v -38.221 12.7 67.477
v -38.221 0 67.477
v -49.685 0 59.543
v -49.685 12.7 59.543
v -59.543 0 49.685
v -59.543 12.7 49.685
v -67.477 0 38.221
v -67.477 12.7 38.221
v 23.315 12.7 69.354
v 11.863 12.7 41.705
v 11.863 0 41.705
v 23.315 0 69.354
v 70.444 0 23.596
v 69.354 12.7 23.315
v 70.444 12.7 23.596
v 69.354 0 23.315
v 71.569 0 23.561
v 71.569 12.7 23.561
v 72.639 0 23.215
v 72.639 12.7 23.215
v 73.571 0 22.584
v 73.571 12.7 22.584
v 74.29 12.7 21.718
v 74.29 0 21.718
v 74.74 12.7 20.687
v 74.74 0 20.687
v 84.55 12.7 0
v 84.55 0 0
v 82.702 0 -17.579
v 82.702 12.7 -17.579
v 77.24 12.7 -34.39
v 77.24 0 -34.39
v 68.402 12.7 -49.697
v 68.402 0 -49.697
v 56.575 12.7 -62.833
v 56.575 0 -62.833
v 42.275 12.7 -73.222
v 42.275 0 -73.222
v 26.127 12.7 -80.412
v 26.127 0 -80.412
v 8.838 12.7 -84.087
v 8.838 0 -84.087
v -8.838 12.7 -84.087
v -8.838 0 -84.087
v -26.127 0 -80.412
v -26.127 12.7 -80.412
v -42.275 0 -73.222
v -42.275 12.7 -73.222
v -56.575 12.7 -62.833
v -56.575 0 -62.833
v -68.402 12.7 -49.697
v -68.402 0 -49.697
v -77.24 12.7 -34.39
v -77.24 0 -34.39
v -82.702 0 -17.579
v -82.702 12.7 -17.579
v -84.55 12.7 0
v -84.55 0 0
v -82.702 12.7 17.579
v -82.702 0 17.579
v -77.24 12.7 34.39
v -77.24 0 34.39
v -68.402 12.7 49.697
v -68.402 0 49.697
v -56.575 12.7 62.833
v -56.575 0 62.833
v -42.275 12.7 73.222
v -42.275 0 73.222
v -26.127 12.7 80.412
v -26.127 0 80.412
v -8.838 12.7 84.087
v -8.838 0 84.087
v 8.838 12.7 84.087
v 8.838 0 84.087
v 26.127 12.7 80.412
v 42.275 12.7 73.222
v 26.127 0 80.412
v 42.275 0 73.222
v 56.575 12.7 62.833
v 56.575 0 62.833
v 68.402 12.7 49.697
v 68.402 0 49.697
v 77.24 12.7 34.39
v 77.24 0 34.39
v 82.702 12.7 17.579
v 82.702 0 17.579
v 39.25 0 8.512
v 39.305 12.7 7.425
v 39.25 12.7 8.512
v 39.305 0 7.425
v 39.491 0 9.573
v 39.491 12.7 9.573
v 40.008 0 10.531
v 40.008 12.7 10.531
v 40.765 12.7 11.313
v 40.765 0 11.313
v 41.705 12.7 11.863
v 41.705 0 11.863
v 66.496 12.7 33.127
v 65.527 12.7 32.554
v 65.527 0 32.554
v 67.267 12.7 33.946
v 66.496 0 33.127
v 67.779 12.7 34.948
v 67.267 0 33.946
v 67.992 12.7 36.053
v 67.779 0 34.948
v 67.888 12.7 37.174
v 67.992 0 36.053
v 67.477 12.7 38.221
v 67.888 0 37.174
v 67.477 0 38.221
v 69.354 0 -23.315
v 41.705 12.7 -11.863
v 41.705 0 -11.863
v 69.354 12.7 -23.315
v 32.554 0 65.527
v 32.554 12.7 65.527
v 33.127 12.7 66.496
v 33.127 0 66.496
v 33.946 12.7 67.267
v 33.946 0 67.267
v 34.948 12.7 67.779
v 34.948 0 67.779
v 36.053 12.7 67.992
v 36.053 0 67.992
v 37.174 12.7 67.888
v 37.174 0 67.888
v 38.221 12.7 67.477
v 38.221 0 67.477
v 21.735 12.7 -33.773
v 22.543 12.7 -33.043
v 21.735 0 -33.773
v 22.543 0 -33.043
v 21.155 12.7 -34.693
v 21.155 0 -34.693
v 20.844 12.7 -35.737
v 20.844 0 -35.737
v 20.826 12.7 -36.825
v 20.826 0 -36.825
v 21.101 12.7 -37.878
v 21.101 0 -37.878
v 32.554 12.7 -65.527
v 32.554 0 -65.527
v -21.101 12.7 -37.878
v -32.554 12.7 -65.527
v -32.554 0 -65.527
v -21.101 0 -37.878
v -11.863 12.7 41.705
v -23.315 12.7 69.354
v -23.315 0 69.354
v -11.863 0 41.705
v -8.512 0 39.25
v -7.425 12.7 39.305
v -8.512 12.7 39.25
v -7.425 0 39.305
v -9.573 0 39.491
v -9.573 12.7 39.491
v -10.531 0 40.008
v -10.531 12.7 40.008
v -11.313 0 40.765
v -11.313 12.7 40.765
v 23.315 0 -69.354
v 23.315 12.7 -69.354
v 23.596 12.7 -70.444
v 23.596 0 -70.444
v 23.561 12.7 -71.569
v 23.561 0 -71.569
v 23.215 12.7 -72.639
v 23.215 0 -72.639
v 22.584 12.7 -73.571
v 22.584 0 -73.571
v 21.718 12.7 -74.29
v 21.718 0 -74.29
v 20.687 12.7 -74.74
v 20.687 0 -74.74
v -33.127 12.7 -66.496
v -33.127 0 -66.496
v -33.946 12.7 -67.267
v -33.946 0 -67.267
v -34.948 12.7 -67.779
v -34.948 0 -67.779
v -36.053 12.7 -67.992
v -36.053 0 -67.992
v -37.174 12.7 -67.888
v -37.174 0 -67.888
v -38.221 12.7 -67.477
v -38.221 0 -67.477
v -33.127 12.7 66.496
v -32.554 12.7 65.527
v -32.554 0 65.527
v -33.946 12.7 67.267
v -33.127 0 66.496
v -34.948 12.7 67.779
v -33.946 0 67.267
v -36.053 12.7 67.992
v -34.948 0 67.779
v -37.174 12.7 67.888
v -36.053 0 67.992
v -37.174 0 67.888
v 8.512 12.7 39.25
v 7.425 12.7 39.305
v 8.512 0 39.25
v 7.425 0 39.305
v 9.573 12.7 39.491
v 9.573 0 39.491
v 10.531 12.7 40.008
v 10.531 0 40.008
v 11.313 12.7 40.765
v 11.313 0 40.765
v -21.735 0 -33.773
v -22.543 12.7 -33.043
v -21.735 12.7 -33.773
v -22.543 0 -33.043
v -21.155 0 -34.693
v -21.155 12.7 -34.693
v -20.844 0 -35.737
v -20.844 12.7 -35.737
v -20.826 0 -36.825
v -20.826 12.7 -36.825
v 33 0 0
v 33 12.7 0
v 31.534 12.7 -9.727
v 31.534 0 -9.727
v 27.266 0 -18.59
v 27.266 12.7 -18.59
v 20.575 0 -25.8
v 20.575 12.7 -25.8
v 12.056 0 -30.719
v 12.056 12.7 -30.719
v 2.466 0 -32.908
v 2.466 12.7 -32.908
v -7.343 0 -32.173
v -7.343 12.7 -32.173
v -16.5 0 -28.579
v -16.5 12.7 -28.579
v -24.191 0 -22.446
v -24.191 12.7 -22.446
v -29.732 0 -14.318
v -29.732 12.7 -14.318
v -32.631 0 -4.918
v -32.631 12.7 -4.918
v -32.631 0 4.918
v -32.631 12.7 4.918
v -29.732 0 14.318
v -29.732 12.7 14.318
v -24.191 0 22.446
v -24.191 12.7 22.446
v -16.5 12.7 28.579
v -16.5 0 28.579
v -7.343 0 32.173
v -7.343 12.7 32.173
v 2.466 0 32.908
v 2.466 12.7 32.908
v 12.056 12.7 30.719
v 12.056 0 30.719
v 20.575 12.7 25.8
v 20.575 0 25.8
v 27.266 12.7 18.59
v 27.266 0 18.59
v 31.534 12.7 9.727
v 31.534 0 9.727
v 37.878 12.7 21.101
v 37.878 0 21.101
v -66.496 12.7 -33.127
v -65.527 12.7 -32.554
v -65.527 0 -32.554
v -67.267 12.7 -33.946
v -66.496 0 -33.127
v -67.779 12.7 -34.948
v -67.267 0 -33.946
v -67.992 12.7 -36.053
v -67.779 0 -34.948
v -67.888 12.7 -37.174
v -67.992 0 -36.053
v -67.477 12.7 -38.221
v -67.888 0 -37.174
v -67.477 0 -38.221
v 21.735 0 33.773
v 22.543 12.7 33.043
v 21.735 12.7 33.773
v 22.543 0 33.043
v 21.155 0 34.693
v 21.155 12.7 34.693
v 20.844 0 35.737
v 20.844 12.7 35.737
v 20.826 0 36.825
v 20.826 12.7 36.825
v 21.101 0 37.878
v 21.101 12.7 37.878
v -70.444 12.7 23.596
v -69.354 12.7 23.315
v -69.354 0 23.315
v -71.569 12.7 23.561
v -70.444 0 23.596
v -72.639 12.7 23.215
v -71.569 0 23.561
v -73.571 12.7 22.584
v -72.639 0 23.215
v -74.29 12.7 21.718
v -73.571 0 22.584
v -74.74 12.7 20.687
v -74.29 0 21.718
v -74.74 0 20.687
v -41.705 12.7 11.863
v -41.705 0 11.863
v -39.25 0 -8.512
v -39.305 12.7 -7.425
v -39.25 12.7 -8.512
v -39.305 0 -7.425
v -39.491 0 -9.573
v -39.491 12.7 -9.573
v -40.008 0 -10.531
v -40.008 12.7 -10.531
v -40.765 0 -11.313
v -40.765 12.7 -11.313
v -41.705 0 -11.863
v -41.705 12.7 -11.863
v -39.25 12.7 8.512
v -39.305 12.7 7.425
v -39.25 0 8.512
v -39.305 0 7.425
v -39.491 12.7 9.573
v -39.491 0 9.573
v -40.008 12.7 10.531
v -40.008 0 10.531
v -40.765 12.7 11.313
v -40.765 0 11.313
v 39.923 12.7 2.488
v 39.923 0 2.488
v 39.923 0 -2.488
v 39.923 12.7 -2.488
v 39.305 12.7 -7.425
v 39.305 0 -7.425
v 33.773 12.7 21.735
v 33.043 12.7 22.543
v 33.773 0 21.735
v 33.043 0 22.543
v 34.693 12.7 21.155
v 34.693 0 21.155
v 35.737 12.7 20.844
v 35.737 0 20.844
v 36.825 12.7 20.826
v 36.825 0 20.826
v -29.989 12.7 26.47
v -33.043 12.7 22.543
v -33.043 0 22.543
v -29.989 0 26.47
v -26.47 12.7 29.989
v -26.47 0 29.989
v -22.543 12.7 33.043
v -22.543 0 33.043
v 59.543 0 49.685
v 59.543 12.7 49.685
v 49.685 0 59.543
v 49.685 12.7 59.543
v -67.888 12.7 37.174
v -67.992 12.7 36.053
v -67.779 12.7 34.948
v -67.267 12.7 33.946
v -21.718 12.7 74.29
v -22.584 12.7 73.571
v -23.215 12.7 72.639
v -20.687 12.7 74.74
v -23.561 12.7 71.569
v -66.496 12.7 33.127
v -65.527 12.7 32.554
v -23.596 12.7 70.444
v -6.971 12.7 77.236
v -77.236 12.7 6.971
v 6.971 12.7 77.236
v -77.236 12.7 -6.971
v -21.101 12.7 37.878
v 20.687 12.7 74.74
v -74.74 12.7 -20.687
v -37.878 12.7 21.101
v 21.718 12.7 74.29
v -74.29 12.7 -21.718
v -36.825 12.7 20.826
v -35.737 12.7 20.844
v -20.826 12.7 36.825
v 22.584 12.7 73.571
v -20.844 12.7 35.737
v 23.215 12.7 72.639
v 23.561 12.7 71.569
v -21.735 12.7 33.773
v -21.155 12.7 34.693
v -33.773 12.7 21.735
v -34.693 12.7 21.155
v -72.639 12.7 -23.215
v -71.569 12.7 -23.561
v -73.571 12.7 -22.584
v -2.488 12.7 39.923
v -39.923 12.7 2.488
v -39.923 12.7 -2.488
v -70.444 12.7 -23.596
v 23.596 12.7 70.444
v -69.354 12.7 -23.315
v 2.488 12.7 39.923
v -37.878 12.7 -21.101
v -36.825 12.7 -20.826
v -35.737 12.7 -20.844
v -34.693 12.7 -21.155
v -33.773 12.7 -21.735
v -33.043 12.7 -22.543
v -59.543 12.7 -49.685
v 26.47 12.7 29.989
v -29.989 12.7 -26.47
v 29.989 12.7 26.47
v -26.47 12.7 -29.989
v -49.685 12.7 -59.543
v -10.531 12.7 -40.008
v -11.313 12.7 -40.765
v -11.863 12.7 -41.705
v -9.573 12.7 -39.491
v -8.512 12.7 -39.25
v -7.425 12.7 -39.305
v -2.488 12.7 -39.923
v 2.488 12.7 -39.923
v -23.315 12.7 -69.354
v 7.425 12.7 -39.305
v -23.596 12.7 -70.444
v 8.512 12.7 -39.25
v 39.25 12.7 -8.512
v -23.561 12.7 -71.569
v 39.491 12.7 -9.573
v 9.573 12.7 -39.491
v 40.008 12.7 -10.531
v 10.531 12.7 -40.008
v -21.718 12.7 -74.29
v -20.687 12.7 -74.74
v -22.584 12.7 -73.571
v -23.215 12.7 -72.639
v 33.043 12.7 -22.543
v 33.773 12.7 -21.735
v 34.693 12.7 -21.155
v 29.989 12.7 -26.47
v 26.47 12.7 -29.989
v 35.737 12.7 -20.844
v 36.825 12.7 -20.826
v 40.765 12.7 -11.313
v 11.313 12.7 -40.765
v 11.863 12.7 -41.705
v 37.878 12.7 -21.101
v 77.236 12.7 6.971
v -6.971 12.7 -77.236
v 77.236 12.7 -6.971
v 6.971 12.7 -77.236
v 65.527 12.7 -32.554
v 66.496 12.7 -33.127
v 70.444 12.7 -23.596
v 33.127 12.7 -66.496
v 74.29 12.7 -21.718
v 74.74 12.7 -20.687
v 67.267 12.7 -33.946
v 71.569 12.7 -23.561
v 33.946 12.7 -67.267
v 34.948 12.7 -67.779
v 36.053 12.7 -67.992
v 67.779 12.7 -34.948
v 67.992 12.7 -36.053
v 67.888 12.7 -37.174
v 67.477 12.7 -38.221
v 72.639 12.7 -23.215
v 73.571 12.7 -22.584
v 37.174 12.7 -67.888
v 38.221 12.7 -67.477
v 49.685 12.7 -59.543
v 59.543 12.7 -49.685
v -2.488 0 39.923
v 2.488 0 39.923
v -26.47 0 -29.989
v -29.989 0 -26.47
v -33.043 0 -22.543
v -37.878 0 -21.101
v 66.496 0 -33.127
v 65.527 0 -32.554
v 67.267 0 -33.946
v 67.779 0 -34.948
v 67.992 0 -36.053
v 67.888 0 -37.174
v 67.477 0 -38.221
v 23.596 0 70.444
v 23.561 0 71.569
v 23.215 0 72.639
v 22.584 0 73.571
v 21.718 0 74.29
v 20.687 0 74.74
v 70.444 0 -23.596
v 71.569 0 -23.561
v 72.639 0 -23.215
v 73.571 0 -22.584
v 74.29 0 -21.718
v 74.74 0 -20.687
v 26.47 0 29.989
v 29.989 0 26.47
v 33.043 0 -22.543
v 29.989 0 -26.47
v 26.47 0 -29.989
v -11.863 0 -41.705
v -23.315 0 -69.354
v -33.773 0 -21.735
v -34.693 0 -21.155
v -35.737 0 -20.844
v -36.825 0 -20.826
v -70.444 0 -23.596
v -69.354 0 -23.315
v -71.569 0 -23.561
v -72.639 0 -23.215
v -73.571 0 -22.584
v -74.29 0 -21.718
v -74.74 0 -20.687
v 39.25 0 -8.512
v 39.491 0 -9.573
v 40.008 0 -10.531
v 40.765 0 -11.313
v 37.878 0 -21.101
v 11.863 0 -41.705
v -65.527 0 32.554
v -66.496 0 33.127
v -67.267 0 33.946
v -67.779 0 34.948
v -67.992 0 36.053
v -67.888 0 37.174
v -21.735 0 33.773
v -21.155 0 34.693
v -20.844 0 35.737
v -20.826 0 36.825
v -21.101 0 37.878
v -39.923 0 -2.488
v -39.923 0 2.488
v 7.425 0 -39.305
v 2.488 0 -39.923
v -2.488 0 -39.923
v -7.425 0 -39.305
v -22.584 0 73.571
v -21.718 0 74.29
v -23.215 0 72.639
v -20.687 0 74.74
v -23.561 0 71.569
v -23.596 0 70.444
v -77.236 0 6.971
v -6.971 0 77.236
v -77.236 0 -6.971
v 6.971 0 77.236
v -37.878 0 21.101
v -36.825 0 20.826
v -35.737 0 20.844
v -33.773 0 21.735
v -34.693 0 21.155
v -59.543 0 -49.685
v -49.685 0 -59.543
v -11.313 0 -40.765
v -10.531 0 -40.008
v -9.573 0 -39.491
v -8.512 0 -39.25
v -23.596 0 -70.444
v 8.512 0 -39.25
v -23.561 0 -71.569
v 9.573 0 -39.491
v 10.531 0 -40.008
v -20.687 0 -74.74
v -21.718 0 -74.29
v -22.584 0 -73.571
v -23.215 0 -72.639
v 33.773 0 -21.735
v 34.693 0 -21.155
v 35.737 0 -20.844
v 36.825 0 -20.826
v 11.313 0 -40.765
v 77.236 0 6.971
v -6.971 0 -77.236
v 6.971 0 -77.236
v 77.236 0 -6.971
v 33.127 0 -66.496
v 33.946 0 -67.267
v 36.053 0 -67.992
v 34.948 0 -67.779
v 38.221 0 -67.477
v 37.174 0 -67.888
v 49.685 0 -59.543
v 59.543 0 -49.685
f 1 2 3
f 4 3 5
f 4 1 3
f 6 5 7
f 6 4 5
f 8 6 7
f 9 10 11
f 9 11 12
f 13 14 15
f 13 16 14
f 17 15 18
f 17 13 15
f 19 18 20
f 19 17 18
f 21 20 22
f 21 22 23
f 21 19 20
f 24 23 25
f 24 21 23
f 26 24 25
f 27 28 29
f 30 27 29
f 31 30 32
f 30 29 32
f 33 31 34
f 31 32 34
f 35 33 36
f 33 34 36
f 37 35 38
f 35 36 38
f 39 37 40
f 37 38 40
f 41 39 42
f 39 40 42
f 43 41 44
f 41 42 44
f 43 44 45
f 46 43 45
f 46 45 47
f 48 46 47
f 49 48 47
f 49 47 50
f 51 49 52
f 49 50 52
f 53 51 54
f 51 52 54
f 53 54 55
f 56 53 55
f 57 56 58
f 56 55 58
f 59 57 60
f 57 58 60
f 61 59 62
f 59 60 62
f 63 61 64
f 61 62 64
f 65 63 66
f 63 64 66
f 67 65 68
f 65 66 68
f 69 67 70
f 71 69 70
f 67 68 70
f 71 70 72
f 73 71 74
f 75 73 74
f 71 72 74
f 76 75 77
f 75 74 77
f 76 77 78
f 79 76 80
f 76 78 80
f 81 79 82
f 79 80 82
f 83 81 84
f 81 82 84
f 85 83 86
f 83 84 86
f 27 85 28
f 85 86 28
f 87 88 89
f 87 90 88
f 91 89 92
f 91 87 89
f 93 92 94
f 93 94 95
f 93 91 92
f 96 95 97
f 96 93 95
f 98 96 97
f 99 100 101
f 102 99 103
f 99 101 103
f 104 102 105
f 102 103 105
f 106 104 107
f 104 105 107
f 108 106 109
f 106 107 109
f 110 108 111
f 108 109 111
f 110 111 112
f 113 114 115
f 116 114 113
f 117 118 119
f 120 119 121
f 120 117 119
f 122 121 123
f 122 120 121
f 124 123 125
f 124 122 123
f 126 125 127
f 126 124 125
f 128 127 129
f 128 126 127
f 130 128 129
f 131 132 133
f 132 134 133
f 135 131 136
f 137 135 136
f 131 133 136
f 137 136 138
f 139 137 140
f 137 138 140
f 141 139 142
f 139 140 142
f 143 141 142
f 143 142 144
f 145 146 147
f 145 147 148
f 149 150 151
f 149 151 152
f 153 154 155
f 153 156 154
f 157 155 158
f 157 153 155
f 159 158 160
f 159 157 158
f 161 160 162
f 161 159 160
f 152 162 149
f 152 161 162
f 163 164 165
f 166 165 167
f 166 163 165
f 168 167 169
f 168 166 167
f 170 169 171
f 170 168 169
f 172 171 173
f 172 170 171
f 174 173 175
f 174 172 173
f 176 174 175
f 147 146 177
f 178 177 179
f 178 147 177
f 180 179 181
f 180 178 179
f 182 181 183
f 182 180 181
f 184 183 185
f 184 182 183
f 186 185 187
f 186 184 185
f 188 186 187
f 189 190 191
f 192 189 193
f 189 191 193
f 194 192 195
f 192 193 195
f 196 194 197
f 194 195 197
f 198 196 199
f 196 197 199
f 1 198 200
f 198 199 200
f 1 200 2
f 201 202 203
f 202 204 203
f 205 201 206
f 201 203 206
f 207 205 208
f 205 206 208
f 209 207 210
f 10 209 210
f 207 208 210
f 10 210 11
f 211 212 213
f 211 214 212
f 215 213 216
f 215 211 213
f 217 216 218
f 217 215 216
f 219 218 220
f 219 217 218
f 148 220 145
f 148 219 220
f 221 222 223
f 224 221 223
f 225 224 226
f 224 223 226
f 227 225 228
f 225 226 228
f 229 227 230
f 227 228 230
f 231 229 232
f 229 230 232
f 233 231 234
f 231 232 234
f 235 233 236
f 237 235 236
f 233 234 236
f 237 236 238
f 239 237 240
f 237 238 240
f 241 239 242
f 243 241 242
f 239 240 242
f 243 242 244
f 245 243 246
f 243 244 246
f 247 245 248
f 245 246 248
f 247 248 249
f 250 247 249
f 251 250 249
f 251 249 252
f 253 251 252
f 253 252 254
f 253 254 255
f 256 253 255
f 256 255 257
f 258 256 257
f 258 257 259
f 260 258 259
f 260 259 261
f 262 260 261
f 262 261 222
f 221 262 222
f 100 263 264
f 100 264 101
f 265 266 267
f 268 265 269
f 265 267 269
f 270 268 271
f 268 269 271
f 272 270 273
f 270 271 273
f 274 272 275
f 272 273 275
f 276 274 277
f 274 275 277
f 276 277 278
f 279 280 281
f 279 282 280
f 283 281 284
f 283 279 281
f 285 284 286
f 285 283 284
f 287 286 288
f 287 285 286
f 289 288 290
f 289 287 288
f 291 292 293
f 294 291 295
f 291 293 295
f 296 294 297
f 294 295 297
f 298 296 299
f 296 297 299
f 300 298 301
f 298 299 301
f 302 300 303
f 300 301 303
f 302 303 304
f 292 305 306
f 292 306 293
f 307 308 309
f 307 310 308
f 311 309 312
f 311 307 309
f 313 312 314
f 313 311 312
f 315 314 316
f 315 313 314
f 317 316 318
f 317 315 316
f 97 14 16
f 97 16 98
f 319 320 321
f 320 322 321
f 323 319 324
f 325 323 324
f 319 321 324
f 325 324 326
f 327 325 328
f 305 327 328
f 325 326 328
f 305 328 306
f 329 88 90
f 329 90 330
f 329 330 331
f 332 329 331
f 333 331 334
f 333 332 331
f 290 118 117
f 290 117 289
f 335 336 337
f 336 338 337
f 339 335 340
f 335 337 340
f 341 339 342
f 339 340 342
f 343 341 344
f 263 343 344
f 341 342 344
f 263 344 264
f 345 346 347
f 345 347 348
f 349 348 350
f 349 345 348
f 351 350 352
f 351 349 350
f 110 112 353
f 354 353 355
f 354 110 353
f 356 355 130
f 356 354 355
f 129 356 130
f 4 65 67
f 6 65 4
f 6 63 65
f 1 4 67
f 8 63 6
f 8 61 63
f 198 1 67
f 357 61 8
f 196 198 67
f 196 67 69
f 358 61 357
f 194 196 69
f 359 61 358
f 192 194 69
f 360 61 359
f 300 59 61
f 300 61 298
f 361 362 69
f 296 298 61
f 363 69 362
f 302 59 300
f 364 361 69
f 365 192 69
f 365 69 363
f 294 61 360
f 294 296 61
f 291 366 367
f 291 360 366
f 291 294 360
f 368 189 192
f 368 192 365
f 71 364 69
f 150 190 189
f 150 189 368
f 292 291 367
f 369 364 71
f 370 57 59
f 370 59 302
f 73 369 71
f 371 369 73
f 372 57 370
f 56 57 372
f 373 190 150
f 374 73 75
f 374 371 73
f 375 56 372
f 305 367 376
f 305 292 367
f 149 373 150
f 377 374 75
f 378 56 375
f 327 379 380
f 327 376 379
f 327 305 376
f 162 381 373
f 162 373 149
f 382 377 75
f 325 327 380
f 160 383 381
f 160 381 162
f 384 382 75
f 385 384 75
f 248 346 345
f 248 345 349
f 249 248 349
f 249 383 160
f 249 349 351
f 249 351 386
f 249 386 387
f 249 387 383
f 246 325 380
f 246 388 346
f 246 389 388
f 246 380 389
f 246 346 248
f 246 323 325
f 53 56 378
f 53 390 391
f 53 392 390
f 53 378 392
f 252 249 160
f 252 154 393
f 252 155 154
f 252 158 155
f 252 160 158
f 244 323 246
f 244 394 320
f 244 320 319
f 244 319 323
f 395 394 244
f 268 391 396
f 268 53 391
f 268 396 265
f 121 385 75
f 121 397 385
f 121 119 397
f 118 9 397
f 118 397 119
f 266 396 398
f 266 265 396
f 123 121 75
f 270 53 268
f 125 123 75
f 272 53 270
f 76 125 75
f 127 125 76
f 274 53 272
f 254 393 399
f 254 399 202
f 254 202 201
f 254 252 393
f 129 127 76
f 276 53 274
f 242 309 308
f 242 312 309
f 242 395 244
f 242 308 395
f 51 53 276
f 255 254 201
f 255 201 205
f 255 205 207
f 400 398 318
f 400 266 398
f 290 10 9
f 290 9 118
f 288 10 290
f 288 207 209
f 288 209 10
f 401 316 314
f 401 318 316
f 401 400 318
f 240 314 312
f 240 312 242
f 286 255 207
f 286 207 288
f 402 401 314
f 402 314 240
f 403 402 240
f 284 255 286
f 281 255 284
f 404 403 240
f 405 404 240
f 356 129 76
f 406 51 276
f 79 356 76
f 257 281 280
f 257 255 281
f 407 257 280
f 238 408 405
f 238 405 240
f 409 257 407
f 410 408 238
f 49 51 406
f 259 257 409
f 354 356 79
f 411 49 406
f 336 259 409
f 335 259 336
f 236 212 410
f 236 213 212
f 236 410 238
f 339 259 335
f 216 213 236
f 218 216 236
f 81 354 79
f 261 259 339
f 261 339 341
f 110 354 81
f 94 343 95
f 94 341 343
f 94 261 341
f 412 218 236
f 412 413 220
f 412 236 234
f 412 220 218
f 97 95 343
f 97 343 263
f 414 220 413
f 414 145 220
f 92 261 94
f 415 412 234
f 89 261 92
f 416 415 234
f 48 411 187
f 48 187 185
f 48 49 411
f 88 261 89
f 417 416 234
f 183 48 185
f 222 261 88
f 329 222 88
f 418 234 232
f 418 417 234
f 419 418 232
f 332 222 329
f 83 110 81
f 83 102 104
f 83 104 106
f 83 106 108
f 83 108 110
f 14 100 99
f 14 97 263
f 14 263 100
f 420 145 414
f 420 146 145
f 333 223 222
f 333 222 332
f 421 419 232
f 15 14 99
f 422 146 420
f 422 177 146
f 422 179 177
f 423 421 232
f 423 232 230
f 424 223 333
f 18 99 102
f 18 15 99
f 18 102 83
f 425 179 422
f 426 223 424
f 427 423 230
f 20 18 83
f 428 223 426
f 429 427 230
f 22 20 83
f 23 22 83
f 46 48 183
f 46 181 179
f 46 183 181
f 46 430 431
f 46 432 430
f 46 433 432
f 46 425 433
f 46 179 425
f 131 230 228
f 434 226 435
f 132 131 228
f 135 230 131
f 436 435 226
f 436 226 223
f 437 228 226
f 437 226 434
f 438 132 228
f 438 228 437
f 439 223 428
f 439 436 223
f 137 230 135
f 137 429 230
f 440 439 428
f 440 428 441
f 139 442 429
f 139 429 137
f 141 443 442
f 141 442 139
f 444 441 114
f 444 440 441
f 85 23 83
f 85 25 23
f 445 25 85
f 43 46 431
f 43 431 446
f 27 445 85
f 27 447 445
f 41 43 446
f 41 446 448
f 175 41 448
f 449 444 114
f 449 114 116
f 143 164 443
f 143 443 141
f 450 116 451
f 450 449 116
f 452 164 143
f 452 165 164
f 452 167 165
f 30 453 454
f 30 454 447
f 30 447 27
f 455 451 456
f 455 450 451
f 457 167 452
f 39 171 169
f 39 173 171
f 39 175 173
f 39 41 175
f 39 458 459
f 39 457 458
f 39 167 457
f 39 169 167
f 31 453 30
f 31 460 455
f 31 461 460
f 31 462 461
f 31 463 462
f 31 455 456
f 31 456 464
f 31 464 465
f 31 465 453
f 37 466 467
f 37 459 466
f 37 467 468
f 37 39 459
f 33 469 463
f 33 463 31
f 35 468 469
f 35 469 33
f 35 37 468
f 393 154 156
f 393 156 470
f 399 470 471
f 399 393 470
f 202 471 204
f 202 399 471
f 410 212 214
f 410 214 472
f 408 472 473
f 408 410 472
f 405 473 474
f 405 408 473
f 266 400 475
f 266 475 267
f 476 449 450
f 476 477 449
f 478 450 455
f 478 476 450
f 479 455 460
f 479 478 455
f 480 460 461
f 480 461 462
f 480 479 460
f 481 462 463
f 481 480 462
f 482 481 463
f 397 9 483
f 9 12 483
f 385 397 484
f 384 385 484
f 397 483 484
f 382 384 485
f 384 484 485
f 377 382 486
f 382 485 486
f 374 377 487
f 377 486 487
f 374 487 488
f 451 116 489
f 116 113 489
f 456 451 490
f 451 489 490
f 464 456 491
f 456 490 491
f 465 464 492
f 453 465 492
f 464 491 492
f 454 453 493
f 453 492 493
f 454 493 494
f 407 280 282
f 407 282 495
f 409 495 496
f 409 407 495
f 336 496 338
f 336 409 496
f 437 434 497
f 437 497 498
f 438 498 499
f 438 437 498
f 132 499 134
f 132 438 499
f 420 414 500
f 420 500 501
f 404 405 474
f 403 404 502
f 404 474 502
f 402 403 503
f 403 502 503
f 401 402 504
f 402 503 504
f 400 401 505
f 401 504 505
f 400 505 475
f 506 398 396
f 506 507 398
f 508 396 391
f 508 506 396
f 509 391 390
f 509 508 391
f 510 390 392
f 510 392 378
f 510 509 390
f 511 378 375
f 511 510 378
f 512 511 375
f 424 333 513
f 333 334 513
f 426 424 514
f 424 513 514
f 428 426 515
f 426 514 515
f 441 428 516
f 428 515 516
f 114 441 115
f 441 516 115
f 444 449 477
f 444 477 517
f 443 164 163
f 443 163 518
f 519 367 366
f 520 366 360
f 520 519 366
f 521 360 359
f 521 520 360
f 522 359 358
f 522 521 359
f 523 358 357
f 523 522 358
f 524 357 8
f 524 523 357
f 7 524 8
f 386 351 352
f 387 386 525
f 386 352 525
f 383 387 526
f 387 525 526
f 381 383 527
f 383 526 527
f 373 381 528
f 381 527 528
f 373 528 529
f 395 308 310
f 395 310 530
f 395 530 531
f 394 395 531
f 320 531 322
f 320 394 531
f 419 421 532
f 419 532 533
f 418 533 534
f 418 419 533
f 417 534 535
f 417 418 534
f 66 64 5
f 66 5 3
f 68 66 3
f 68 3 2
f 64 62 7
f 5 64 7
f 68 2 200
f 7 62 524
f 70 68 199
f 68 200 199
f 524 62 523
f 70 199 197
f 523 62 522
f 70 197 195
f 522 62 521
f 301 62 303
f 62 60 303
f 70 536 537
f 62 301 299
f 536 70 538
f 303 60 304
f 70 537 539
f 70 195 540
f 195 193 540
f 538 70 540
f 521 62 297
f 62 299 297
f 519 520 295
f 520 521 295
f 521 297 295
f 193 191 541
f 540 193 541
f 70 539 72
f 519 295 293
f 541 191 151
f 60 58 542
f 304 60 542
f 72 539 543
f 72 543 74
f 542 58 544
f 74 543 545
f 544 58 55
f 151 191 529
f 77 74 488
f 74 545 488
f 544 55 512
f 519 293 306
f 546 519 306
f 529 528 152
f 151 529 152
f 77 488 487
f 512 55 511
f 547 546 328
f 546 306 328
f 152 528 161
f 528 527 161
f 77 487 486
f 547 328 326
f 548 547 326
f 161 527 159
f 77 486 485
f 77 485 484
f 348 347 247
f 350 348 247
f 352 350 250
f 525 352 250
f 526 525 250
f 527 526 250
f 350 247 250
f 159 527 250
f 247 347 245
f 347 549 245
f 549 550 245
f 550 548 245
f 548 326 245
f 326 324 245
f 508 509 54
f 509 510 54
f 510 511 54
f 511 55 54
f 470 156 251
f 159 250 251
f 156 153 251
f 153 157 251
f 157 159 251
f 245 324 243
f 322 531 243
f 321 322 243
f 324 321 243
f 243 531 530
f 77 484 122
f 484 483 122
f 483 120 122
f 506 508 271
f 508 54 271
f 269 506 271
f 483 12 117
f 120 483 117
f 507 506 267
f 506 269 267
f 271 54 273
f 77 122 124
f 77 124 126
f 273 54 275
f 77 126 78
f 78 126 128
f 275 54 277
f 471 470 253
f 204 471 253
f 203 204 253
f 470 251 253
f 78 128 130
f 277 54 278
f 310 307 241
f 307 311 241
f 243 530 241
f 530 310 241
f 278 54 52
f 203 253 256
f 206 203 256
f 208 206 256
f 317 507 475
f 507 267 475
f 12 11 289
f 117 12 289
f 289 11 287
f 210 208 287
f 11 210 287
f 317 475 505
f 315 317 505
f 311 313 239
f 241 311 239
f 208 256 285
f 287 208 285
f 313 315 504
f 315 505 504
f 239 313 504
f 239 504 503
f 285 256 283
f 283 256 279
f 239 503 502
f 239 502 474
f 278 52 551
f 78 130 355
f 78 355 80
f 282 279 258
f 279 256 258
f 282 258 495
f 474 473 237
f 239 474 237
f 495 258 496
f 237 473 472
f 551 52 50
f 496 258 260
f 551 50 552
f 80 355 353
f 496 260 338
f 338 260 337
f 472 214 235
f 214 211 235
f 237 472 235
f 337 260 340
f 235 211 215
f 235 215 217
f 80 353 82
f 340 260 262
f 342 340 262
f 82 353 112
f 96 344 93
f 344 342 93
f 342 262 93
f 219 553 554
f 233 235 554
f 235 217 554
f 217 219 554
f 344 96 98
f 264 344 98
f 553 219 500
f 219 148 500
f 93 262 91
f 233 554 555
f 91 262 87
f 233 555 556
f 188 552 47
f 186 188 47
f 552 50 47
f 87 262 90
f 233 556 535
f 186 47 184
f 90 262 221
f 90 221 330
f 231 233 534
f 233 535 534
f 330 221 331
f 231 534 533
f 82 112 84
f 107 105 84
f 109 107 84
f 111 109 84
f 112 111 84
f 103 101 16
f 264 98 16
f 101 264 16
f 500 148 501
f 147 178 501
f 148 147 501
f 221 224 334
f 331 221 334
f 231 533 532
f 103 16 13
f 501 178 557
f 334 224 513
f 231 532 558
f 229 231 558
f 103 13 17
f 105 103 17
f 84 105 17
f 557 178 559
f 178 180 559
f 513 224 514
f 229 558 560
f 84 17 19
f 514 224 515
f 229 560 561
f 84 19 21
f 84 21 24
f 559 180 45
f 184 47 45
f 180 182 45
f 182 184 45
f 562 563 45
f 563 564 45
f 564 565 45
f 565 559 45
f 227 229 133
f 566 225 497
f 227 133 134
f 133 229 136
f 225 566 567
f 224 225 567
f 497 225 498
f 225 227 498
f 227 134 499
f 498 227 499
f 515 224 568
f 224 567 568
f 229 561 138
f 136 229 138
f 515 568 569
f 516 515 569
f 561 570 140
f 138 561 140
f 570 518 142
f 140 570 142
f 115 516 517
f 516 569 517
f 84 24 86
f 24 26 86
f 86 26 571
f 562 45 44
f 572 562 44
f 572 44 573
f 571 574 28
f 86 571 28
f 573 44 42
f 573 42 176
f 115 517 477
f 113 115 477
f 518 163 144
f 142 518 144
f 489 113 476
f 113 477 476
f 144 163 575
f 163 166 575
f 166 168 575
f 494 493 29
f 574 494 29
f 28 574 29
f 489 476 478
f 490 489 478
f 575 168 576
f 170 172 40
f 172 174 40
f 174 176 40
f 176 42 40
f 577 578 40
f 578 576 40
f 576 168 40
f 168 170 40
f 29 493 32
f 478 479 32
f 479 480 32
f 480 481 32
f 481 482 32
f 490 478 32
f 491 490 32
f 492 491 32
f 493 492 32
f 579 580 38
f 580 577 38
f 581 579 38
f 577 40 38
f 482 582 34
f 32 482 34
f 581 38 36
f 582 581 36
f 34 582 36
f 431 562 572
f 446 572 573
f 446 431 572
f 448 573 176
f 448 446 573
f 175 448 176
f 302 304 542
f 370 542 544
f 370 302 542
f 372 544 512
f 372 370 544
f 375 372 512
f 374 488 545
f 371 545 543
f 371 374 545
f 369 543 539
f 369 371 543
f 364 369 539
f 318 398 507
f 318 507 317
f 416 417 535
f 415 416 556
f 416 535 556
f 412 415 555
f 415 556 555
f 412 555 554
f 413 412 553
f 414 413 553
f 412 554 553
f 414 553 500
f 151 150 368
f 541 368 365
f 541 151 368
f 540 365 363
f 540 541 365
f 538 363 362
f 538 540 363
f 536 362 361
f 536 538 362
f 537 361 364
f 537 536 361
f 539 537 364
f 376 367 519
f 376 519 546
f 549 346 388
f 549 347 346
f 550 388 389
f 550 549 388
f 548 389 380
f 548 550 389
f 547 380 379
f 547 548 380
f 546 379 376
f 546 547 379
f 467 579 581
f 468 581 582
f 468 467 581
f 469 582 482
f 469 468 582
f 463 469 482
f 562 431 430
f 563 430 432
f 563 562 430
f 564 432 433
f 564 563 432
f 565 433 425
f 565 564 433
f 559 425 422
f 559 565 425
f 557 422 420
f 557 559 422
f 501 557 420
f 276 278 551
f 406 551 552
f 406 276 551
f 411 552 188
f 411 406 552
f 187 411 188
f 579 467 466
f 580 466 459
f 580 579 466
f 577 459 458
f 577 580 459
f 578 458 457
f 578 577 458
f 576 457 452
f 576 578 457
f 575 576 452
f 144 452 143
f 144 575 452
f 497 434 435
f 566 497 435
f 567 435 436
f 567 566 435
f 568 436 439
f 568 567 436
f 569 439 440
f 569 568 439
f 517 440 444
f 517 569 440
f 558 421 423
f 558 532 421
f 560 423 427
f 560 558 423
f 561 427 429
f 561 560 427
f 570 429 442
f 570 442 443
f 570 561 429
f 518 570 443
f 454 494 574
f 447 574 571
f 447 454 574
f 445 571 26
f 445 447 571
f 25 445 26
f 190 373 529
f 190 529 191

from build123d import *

# Parameters (mm, degrees)
SKETCH2_W                = 82.55
SKETCH2_H                = 12.7
CUT_EXTRUDE1_DEPTH       = 13.7
FILLET1_R                = 4
CIRPATTERN4_COUNT        = 8
FILLET1_OF_CIRPATTERN4_R = 4
SKETCH9_R                = 33
CUT_EXTRUDE2_DEPTH       = 13.7
SKETCH10_R               = 84.55
SKETCH10_R_2             = 82.55
BOSS_EXTRUDE1_DEPTH      = 12.7


with BuildPart() as part:
    # Sketch2 → Revolve1 (revolve)
    with BuildSketch(Plane(origin=(0, 0, 0), x_dir=(0, 0, -1), z_dir=(1, 0, 0))):
        with Locations((-41.275, 6.35)):
            Rectangle(SKETCH2_W, SKETCH2_H)
    revolve(axis=Axis((0, -0.5, 0), (0, 1, 0)))

    # Sketch8 → Cut-Extrude1 (cut, through all)
    with BuildSketch(Plane(origin=(0, 12.7, 0), x_dir=(1, 0, 0), z_dir=(0, 1, 0))):
        with BuildLine():
            Line((-10.567880231, 38.578749428), (-24.995954941, 73.411203073))
            ThreePointArc((-24.995954941, 73.411203073), (0, 77.55), (24.995954941, 73.411203073))
            Line((24.995954941, 73.411203073), (10.567880231, 38.578749428))
            ThreePointArc((10.567880231, 38.578749428), (0, 40), (-10.567880231, 38.578749428))
        make_face()
    cut_extrude1 = extrude(amount=-CUT_EXTRUDE1_DEPTH, mode=Mode.SUBTRACT)

    # Fillet1
    fillet1_edges = [part.edges().sort_by_distance(p)[0] for p in [
        (10.567880231, 6.35, -38.578749428),
        (-10.567880231, 6.35, -38.578749428),
        (-24.995954941, 6.35, -73.411203073),
        (24.995954941, 6.35, -73.411203073),
    ]]
    fillet(fillet1_edges, radius=FILLET1_R)

    # CirPattern4: Cut-Extrude1 ×8 about axis
    cirpattern4_axis = Axis((0, 0, 0), (0, 1, 0))
    for i in range(1, CIRPATTERN4_COUNT):
        add(cut_extrude1.rotate(cirpattern4_axis, i * 360 / CIRPATTERN4_COUNT), mode=Mode.SUBTRACT)

    # Fillet1 of CirPattern4
    fillet1_of_cirpattern4_edges = [part.edges().sort_by_distance(p)[0] for p in [
        (-19.806675556, 6.35, -34.751915104),
        (-34.751915104, 6.35, -19.806675556),
        (-69.584368749, 6.35, -34.234750266),
        (-34.234750266, 6.35, -69.584368749),
        (-38.578749428, 6.35, -10.567880231),
        (-38.578749428, 6.35, 10.567880231),
        (-73.411203073, 6.35, 24.995954941),
        (-73.411203073, 6.35, -24.995954941),
        (-34.751915104, 6.35, 19.806675556),
        (-19.806675556, 6.35, 34.751915104),
        (-34.234750266, 6.35, 69.584368749),
        (-69.584368749, 6.35, 34.234750266),
        (-10.567880231, 6.35, 38.578749428),
        (10.567880231, 6.35, 38.578749428),
        (24.995954941, 6.35, 73.411203073),
        (-24.995954941, 6.35, 73.411203073),
        (19.806675556, 6.35, 34.751915104),
        (34.751915104, 6.35, 19.806675556),
        (69.584368749, 6.35, 34.234750266),
        (34.234750266, 6.35, 69.584368749),
        (38.578749428, 6.35, 10.567880231),
        (38.578749428, 6.35, -10.567880231),
        (73.411203073, 6.35, -24.995954941),
        (73.411203073, 6.35, 24.995954941),
        (34.751915104, 6.35, -19.806675556),
        (19.806675556, 6.35, -34.751915104),
        (34.234750266, 6.35, -69.584368749),
        (69.584368749, 6.35, -34.234750266),
    ]]
    fillet(fillet1_of_cirpattern4_edges, radius=FILLET1_OF_CIRPATTERN4_R)

    # Sketch9 → Cut-Extrude2 (cut, through all)
    with BuildSketch(Plane(origin=(0, 12.7, 0), x_dir=(1, 0, 0), z_dir=(0, 1, 0))):
        Circle(SKETCH9_R)
    extrude(amount=-CUT_EXTRUDE2_DEPTH, mode=Mode.SUBTRACT)

    # Sketch10 → Boss-Extrude1 (add)
    with BuildSketch(Plane(origin=(0, 0, 0), x_dir=(1, 0, 0), z_dir=(0, 1, 0))):
        Circle(SKETCH10_R)
        Circle(SKETCH10_R_2, mode=Mode.SUBTRACT)
    extrude(amount=BOSS_EXTRUDE1_DEPTH)


solid = part.part
